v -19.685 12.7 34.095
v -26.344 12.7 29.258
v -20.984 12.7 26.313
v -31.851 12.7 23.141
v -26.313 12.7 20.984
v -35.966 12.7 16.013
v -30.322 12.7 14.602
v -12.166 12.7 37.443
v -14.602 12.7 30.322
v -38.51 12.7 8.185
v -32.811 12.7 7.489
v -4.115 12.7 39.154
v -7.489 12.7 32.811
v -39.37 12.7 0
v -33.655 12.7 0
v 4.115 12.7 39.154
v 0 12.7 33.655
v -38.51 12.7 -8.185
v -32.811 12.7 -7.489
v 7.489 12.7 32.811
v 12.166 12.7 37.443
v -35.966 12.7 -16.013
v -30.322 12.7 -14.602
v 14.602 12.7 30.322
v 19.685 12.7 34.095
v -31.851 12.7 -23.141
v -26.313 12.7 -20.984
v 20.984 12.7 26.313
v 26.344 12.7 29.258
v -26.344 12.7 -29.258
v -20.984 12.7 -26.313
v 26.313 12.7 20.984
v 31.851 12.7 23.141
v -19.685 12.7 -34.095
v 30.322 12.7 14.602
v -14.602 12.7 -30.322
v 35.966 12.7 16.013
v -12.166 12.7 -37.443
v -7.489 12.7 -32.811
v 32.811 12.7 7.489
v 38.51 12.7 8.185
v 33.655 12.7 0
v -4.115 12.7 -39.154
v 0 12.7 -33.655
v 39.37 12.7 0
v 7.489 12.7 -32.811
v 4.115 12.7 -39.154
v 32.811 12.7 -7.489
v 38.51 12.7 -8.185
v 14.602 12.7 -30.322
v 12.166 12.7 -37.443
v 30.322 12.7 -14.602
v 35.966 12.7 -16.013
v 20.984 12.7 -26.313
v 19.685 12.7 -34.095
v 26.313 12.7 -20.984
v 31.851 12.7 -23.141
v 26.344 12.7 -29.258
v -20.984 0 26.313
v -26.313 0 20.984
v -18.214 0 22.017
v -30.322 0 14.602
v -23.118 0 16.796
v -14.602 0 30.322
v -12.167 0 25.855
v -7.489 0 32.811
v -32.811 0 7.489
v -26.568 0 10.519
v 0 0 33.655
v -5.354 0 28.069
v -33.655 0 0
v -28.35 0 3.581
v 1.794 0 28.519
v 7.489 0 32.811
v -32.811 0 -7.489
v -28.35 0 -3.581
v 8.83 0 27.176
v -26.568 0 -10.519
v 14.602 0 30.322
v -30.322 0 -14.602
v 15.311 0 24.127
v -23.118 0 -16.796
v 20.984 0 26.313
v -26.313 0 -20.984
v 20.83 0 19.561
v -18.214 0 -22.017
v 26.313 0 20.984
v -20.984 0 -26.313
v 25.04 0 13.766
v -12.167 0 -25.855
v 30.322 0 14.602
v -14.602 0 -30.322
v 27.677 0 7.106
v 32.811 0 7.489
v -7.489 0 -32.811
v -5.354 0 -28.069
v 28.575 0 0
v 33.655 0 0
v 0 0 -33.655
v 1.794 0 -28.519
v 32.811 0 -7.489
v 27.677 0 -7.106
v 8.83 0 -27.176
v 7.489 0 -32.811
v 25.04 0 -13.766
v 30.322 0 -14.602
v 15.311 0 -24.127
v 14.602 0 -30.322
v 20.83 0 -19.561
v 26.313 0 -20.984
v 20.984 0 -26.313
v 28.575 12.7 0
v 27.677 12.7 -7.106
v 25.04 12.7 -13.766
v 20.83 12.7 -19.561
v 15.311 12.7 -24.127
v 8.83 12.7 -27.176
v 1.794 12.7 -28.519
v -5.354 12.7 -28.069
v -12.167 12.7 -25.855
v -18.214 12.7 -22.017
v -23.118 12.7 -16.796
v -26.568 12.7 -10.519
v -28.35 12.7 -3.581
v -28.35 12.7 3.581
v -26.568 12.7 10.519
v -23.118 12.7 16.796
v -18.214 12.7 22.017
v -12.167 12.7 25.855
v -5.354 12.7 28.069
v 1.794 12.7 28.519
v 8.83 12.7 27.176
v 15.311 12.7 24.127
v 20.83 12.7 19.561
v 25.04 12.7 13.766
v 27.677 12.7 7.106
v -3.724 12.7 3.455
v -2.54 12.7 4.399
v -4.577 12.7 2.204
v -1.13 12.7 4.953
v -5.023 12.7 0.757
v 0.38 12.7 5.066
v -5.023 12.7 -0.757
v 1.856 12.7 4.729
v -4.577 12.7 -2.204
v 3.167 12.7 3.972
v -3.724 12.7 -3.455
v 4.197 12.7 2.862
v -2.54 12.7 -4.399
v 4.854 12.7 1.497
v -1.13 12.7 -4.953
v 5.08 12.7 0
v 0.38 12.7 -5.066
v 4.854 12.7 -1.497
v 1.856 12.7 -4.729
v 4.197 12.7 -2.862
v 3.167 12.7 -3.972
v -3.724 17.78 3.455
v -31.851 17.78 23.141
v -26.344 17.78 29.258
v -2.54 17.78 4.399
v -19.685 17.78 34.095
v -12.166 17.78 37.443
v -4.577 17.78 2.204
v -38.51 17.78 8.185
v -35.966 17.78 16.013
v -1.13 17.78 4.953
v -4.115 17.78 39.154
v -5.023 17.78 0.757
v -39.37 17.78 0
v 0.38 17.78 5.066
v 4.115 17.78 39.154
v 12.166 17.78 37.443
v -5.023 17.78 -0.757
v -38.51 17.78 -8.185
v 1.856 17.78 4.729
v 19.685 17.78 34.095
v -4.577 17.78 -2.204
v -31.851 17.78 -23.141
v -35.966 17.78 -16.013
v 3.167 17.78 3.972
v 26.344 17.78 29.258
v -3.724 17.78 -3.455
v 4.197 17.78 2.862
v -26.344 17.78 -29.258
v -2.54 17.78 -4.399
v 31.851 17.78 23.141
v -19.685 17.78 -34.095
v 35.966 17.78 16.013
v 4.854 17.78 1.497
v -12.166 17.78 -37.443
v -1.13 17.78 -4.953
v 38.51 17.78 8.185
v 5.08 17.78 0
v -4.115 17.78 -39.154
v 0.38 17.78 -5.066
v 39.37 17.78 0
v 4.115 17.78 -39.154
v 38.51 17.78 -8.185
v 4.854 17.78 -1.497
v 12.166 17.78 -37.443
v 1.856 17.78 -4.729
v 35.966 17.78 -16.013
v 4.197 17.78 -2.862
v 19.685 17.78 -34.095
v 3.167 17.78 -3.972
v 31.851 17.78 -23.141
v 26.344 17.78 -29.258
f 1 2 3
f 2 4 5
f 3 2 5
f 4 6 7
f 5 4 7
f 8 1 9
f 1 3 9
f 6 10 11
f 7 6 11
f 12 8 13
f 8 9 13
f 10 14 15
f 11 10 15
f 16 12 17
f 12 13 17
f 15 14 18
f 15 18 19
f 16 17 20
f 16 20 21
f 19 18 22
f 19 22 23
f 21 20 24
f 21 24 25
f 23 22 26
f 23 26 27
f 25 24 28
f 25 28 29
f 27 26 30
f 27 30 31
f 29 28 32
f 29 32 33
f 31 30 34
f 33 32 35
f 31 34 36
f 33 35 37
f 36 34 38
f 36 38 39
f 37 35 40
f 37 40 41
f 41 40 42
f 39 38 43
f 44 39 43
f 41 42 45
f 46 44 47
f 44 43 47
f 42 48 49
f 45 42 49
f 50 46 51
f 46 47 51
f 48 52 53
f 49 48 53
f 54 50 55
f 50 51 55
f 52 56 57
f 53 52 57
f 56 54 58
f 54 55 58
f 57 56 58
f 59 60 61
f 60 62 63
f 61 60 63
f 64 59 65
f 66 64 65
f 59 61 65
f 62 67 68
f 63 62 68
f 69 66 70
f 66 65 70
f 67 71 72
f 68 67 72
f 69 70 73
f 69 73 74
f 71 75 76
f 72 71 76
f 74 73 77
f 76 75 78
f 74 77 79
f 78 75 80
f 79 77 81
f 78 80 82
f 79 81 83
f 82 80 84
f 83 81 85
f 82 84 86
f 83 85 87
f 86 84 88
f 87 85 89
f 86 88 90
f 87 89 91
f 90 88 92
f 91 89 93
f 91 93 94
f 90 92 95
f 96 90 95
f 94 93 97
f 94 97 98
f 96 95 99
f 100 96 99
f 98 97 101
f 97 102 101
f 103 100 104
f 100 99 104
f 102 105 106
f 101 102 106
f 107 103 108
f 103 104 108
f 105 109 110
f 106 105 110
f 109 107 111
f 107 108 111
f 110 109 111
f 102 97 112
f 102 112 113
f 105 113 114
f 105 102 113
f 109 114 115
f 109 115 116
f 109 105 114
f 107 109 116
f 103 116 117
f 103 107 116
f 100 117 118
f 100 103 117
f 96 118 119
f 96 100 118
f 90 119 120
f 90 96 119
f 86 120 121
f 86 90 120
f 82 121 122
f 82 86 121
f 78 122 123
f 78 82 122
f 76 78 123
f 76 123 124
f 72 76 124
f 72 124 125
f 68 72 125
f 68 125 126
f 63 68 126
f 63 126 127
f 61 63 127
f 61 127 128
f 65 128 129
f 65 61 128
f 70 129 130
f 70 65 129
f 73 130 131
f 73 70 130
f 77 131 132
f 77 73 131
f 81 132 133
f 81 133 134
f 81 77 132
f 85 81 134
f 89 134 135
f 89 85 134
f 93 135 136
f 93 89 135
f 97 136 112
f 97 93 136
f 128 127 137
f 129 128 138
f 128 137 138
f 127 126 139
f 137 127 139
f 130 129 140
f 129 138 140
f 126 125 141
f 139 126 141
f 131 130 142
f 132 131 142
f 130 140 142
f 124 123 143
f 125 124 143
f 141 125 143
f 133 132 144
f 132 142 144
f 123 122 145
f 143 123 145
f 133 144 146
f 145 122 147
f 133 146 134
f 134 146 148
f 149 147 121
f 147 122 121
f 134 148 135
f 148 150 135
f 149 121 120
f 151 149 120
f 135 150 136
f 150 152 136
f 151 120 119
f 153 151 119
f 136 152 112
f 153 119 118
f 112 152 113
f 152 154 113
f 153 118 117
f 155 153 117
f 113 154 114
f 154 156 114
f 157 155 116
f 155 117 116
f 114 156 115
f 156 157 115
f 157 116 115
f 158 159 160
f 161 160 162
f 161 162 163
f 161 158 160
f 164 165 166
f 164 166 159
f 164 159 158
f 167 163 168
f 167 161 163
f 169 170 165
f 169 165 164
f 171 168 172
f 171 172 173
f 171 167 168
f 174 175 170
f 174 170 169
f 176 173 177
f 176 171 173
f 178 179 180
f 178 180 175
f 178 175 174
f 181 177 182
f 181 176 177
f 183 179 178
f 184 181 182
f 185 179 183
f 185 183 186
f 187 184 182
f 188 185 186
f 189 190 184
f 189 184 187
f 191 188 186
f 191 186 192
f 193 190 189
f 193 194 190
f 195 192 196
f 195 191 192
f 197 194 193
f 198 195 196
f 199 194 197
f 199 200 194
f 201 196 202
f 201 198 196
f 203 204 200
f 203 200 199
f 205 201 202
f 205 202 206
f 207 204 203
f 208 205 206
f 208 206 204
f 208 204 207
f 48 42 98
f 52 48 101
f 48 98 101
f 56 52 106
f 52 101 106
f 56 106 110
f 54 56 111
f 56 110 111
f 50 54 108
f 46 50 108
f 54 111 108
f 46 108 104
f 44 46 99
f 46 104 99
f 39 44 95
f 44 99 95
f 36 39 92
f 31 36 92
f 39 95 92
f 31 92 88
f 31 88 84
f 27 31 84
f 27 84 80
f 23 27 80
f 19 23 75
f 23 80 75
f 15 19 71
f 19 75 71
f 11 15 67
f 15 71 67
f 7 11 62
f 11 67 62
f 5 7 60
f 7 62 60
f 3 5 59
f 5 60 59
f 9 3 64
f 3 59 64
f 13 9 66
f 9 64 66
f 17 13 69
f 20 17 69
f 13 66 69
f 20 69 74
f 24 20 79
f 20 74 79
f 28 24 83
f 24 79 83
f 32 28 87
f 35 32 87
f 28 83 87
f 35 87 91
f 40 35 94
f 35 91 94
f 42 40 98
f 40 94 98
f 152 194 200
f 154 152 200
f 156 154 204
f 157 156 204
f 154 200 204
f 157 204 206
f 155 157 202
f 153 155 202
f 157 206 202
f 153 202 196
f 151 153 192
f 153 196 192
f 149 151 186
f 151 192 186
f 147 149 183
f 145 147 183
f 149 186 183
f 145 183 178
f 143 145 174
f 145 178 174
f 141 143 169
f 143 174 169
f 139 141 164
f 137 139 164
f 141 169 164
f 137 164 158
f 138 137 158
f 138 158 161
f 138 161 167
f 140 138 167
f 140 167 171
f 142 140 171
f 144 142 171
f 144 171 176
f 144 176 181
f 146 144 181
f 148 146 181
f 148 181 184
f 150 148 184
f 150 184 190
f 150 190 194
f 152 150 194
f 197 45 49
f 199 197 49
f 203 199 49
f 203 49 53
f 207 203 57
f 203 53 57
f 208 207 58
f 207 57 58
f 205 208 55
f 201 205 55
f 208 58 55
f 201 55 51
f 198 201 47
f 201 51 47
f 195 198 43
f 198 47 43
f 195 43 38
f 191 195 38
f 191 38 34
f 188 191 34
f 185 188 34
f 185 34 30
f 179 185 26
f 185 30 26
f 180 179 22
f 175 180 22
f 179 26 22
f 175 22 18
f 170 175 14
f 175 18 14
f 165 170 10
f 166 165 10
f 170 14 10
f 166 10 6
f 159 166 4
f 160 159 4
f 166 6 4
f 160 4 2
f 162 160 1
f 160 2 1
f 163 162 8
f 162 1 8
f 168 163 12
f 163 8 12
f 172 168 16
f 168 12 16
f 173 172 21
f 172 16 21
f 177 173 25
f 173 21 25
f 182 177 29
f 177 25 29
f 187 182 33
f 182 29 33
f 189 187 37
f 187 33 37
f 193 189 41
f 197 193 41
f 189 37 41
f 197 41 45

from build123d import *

# Parameters (mm, degrees)
SKETCH1_R               = 33.655
SKETCH1_R_2             = 28.575
BOSS_EXTRUDE1_DEPTH     = 12.7
SKETCH2_R               = 39.37
BOSS_EXTRUDE2_DEPTH     = 5.08
SKETCH3_R               = 5.08
CUT_EXTRUDE1_DEPTH      = 1
CUT_EXTRUDE1_DEPTH_BACK = 18.78


with BuildPart() as part:
    # Sketch1 → Boss-Extrude1 (new body)
    with BuildSketch(Plane(origin=(0, 0, 0), x_dir=(1, 0, 0), z_dir=(0, 1, 0))):
        Circle(SKETCH1_R)
        Circle(SKETCH1_R_2, mode=Mode.SUBTRACT)
    extrude(amount=BOSS_EXTRUDE1_DEPTH)

    # Sketch2 → Boss-Extrude2 (add)
    with BuildSketch(Plane(origin=(0, 12.7, 0), x_dir=(1, 0, 0), z_dir=(0, 1, 0))):
        Circle(SKETCH2_R)
    extrude(amount=BOSS_EXTRUDE2_DEPTH)

    # Sketch3 → Cut-Extrude1 (cut, two sides)
    with BuildSketch(Plane(origin=(0, 17.78, 0), x_dir=(1, 0, 0), z_dir=(0, 1, 0))) as cut_extrude1_sk:
        Circle(SKETCH3_R)
    extrude(amount=CUT_EXTRUDE1_DEPTH, mode=Mode.SUBTRACT)
    extrude(cut_extrude1_sk.sketch, amount=-CUT_EXTRUDE1_DEPTH_BACK, mode=Mode.SUBTRACT)


solid = part.part
